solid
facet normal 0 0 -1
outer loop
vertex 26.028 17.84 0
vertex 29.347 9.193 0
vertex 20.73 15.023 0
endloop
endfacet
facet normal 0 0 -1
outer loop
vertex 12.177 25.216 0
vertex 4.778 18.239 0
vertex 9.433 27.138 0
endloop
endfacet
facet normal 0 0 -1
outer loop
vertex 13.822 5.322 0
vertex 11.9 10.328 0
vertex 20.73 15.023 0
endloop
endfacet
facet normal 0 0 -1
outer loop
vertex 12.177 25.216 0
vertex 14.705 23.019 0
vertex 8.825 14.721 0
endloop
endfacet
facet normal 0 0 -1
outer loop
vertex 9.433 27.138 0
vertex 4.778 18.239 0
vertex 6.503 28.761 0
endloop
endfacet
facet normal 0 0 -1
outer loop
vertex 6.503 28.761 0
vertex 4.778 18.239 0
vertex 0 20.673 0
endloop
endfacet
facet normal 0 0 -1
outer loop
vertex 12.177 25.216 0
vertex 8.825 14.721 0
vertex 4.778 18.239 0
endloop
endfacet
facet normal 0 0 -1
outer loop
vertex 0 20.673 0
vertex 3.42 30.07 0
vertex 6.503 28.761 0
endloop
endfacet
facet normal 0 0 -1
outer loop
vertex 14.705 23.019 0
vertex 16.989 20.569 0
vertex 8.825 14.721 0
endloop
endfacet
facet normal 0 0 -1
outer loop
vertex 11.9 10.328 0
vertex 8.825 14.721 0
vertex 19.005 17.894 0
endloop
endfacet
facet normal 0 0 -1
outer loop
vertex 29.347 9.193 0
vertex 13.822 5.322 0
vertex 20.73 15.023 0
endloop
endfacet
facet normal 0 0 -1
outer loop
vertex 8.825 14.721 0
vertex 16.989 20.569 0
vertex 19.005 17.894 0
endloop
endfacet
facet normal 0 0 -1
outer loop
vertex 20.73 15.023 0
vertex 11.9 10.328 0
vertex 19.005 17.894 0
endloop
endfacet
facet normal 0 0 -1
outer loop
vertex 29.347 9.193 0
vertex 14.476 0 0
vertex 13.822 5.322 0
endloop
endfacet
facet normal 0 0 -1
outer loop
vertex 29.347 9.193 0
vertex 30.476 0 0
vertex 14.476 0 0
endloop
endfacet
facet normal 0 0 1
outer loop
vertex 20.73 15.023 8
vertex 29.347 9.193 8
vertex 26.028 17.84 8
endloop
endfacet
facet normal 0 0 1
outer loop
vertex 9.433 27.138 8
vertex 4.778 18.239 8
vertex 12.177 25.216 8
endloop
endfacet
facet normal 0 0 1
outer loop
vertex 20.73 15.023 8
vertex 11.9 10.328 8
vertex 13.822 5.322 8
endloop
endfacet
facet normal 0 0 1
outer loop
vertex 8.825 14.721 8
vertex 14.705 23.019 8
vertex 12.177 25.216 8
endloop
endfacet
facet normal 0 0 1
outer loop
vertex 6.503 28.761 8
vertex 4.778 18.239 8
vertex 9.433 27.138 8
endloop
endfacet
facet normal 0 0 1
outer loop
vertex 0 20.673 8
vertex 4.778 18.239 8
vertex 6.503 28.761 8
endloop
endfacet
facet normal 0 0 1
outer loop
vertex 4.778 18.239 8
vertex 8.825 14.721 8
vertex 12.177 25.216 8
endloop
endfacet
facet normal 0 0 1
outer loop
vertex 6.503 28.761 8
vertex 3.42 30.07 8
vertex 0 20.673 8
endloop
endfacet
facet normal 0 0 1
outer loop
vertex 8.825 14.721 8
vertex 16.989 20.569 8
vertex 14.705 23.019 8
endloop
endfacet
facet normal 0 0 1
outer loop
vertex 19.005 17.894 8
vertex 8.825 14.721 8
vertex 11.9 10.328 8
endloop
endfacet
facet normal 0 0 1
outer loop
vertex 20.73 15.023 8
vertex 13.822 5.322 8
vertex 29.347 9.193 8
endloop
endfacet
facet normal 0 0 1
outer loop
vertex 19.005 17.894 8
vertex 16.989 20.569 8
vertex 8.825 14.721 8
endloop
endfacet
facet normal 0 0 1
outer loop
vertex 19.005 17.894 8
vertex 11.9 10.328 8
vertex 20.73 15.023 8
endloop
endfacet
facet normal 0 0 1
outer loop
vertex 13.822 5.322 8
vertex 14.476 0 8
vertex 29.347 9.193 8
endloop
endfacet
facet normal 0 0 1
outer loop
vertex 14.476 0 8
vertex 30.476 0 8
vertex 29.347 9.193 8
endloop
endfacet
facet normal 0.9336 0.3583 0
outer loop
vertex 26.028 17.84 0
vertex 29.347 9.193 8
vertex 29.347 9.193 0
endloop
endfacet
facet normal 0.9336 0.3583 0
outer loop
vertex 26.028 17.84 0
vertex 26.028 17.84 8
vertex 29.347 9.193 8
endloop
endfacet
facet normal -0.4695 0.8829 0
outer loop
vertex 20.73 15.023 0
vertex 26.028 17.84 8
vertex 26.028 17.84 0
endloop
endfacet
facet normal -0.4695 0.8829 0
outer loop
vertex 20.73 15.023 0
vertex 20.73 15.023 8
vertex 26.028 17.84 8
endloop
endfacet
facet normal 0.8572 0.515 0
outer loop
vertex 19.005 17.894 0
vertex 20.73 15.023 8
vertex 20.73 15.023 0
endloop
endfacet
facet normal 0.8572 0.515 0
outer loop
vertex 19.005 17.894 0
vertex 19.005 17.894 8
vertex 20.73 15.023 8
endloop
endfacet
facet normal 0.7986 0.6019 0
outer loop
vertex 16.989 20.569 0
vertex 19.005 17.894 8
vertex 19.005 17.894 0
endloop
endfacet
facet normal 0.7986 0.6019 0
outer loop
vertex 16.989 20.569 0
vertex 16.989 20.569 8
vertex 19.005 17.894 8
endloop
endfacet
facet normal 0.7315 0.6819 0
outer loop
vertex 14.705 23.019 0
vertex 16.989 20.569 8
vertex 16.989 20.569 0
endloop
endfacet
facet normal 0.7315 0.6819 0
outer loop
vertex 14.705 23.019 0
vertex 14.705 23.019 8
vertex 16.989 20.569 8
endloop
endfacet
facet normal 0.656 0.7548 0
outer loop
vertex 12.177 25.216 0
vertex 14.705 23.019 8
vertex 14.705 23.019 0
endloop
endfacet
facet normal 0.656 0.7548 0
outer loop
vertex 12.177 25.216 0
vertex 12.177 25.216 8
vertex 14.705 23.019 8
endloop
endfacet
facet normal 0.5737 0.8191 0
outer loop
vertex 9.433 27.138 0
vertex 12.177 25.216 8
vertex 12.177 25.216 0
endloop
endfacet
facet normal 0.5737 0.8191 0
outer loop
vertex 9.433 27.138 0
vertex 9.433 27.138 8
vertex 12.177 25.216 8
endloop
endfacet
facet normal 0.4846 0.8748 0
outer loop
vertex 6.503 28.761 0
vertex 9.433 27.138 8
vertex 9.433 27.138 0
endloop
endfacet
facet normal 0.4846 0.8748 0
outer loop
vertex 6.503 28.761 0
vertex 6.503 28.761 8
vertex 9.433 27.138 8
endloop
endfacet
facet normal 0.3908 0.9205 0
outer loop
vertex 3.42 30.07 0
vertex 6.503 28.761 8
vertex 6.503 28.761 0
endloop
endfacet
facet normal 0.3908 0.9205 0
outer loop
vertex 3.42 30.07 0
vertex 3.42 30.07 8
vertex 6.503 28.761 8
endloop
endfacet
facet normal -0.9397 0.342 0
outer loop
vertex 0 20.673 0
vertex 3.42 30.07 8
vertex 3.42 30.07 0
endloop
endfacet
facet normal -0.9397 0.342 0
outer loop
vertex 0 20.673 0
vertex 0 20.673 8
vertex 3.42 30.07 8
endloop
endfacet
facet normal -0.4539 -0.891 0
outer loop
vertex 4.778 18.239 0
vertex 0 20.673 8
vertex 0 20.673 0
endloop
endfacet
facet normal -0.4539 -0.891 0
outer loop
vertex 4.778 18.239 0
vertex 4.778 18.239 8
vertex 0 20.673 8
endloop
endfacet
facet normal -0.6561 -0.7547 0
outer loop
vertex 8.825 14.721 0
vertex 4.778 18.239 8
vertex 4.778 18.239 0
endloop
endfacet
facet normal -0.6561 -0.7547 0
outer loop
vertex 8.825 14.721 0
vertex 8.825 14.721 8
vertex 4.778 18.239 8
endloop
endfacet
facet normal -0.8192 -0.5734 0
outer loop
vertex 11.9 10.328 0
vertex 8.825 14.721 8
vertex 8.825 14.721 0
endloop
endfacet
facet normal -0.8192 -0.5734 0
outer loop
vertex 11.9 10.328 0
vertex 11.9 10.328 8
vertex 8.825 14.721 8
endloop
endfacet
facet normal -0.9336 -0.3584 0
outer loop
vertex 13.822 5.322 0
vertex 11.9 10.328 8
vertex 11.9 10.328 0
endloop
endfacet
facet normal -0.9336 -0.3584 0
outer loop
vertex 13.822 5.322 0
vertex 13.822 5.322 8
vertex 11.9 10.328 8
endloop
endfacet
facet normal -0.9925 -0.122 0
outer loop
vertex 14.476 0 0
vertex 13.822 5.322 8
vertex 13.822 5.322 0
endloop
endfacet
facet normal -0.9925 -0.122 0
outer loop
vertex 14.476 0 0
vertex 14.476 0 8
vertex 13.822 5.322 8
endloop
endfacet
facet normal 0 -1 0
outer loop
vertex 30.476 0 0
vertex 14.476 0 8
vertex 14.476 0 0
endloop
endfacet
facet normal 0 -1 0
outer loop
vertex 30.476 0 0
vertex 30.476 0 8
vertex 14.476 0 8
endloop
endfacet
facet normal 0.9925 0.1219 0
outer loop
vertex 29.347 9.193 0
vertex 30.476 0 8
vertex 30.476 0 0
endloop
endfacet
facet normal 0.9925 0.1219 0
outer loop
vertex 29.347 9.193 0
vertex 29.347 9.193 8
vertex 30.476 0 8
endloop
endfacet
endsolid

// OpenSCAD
$fn = 32;

// ----------------------------------------------------------------------
// Arc stop: segment, 8 mm thick
// ----------------------------------------------------------------------

// --- parameters (mm) ---
profile_height = 8;       // extrusion height
profile_points = 17;      // points of the closed outline

profile = [[30.476, 0], [29.347, 9.193], [26.028, 17.84], [20.73, 15.023], [19.005, 17.894], [16.989, 20.569], [14.705, 23.019], [12.177, 25.216], [9.433, 27.138], [6.503, 28.761], [3.42, 30.07], [0, 20.673], [4.778, 18.239], [8.825, 14.721], [11.9, 10.328], [13.822, 5.322], [14.476, 0]];  // single closed polygon, 17 points, counter clockwise

// --- the one profile operation ---
linear_extrude(height = profile_height) polygon(points = profile);
